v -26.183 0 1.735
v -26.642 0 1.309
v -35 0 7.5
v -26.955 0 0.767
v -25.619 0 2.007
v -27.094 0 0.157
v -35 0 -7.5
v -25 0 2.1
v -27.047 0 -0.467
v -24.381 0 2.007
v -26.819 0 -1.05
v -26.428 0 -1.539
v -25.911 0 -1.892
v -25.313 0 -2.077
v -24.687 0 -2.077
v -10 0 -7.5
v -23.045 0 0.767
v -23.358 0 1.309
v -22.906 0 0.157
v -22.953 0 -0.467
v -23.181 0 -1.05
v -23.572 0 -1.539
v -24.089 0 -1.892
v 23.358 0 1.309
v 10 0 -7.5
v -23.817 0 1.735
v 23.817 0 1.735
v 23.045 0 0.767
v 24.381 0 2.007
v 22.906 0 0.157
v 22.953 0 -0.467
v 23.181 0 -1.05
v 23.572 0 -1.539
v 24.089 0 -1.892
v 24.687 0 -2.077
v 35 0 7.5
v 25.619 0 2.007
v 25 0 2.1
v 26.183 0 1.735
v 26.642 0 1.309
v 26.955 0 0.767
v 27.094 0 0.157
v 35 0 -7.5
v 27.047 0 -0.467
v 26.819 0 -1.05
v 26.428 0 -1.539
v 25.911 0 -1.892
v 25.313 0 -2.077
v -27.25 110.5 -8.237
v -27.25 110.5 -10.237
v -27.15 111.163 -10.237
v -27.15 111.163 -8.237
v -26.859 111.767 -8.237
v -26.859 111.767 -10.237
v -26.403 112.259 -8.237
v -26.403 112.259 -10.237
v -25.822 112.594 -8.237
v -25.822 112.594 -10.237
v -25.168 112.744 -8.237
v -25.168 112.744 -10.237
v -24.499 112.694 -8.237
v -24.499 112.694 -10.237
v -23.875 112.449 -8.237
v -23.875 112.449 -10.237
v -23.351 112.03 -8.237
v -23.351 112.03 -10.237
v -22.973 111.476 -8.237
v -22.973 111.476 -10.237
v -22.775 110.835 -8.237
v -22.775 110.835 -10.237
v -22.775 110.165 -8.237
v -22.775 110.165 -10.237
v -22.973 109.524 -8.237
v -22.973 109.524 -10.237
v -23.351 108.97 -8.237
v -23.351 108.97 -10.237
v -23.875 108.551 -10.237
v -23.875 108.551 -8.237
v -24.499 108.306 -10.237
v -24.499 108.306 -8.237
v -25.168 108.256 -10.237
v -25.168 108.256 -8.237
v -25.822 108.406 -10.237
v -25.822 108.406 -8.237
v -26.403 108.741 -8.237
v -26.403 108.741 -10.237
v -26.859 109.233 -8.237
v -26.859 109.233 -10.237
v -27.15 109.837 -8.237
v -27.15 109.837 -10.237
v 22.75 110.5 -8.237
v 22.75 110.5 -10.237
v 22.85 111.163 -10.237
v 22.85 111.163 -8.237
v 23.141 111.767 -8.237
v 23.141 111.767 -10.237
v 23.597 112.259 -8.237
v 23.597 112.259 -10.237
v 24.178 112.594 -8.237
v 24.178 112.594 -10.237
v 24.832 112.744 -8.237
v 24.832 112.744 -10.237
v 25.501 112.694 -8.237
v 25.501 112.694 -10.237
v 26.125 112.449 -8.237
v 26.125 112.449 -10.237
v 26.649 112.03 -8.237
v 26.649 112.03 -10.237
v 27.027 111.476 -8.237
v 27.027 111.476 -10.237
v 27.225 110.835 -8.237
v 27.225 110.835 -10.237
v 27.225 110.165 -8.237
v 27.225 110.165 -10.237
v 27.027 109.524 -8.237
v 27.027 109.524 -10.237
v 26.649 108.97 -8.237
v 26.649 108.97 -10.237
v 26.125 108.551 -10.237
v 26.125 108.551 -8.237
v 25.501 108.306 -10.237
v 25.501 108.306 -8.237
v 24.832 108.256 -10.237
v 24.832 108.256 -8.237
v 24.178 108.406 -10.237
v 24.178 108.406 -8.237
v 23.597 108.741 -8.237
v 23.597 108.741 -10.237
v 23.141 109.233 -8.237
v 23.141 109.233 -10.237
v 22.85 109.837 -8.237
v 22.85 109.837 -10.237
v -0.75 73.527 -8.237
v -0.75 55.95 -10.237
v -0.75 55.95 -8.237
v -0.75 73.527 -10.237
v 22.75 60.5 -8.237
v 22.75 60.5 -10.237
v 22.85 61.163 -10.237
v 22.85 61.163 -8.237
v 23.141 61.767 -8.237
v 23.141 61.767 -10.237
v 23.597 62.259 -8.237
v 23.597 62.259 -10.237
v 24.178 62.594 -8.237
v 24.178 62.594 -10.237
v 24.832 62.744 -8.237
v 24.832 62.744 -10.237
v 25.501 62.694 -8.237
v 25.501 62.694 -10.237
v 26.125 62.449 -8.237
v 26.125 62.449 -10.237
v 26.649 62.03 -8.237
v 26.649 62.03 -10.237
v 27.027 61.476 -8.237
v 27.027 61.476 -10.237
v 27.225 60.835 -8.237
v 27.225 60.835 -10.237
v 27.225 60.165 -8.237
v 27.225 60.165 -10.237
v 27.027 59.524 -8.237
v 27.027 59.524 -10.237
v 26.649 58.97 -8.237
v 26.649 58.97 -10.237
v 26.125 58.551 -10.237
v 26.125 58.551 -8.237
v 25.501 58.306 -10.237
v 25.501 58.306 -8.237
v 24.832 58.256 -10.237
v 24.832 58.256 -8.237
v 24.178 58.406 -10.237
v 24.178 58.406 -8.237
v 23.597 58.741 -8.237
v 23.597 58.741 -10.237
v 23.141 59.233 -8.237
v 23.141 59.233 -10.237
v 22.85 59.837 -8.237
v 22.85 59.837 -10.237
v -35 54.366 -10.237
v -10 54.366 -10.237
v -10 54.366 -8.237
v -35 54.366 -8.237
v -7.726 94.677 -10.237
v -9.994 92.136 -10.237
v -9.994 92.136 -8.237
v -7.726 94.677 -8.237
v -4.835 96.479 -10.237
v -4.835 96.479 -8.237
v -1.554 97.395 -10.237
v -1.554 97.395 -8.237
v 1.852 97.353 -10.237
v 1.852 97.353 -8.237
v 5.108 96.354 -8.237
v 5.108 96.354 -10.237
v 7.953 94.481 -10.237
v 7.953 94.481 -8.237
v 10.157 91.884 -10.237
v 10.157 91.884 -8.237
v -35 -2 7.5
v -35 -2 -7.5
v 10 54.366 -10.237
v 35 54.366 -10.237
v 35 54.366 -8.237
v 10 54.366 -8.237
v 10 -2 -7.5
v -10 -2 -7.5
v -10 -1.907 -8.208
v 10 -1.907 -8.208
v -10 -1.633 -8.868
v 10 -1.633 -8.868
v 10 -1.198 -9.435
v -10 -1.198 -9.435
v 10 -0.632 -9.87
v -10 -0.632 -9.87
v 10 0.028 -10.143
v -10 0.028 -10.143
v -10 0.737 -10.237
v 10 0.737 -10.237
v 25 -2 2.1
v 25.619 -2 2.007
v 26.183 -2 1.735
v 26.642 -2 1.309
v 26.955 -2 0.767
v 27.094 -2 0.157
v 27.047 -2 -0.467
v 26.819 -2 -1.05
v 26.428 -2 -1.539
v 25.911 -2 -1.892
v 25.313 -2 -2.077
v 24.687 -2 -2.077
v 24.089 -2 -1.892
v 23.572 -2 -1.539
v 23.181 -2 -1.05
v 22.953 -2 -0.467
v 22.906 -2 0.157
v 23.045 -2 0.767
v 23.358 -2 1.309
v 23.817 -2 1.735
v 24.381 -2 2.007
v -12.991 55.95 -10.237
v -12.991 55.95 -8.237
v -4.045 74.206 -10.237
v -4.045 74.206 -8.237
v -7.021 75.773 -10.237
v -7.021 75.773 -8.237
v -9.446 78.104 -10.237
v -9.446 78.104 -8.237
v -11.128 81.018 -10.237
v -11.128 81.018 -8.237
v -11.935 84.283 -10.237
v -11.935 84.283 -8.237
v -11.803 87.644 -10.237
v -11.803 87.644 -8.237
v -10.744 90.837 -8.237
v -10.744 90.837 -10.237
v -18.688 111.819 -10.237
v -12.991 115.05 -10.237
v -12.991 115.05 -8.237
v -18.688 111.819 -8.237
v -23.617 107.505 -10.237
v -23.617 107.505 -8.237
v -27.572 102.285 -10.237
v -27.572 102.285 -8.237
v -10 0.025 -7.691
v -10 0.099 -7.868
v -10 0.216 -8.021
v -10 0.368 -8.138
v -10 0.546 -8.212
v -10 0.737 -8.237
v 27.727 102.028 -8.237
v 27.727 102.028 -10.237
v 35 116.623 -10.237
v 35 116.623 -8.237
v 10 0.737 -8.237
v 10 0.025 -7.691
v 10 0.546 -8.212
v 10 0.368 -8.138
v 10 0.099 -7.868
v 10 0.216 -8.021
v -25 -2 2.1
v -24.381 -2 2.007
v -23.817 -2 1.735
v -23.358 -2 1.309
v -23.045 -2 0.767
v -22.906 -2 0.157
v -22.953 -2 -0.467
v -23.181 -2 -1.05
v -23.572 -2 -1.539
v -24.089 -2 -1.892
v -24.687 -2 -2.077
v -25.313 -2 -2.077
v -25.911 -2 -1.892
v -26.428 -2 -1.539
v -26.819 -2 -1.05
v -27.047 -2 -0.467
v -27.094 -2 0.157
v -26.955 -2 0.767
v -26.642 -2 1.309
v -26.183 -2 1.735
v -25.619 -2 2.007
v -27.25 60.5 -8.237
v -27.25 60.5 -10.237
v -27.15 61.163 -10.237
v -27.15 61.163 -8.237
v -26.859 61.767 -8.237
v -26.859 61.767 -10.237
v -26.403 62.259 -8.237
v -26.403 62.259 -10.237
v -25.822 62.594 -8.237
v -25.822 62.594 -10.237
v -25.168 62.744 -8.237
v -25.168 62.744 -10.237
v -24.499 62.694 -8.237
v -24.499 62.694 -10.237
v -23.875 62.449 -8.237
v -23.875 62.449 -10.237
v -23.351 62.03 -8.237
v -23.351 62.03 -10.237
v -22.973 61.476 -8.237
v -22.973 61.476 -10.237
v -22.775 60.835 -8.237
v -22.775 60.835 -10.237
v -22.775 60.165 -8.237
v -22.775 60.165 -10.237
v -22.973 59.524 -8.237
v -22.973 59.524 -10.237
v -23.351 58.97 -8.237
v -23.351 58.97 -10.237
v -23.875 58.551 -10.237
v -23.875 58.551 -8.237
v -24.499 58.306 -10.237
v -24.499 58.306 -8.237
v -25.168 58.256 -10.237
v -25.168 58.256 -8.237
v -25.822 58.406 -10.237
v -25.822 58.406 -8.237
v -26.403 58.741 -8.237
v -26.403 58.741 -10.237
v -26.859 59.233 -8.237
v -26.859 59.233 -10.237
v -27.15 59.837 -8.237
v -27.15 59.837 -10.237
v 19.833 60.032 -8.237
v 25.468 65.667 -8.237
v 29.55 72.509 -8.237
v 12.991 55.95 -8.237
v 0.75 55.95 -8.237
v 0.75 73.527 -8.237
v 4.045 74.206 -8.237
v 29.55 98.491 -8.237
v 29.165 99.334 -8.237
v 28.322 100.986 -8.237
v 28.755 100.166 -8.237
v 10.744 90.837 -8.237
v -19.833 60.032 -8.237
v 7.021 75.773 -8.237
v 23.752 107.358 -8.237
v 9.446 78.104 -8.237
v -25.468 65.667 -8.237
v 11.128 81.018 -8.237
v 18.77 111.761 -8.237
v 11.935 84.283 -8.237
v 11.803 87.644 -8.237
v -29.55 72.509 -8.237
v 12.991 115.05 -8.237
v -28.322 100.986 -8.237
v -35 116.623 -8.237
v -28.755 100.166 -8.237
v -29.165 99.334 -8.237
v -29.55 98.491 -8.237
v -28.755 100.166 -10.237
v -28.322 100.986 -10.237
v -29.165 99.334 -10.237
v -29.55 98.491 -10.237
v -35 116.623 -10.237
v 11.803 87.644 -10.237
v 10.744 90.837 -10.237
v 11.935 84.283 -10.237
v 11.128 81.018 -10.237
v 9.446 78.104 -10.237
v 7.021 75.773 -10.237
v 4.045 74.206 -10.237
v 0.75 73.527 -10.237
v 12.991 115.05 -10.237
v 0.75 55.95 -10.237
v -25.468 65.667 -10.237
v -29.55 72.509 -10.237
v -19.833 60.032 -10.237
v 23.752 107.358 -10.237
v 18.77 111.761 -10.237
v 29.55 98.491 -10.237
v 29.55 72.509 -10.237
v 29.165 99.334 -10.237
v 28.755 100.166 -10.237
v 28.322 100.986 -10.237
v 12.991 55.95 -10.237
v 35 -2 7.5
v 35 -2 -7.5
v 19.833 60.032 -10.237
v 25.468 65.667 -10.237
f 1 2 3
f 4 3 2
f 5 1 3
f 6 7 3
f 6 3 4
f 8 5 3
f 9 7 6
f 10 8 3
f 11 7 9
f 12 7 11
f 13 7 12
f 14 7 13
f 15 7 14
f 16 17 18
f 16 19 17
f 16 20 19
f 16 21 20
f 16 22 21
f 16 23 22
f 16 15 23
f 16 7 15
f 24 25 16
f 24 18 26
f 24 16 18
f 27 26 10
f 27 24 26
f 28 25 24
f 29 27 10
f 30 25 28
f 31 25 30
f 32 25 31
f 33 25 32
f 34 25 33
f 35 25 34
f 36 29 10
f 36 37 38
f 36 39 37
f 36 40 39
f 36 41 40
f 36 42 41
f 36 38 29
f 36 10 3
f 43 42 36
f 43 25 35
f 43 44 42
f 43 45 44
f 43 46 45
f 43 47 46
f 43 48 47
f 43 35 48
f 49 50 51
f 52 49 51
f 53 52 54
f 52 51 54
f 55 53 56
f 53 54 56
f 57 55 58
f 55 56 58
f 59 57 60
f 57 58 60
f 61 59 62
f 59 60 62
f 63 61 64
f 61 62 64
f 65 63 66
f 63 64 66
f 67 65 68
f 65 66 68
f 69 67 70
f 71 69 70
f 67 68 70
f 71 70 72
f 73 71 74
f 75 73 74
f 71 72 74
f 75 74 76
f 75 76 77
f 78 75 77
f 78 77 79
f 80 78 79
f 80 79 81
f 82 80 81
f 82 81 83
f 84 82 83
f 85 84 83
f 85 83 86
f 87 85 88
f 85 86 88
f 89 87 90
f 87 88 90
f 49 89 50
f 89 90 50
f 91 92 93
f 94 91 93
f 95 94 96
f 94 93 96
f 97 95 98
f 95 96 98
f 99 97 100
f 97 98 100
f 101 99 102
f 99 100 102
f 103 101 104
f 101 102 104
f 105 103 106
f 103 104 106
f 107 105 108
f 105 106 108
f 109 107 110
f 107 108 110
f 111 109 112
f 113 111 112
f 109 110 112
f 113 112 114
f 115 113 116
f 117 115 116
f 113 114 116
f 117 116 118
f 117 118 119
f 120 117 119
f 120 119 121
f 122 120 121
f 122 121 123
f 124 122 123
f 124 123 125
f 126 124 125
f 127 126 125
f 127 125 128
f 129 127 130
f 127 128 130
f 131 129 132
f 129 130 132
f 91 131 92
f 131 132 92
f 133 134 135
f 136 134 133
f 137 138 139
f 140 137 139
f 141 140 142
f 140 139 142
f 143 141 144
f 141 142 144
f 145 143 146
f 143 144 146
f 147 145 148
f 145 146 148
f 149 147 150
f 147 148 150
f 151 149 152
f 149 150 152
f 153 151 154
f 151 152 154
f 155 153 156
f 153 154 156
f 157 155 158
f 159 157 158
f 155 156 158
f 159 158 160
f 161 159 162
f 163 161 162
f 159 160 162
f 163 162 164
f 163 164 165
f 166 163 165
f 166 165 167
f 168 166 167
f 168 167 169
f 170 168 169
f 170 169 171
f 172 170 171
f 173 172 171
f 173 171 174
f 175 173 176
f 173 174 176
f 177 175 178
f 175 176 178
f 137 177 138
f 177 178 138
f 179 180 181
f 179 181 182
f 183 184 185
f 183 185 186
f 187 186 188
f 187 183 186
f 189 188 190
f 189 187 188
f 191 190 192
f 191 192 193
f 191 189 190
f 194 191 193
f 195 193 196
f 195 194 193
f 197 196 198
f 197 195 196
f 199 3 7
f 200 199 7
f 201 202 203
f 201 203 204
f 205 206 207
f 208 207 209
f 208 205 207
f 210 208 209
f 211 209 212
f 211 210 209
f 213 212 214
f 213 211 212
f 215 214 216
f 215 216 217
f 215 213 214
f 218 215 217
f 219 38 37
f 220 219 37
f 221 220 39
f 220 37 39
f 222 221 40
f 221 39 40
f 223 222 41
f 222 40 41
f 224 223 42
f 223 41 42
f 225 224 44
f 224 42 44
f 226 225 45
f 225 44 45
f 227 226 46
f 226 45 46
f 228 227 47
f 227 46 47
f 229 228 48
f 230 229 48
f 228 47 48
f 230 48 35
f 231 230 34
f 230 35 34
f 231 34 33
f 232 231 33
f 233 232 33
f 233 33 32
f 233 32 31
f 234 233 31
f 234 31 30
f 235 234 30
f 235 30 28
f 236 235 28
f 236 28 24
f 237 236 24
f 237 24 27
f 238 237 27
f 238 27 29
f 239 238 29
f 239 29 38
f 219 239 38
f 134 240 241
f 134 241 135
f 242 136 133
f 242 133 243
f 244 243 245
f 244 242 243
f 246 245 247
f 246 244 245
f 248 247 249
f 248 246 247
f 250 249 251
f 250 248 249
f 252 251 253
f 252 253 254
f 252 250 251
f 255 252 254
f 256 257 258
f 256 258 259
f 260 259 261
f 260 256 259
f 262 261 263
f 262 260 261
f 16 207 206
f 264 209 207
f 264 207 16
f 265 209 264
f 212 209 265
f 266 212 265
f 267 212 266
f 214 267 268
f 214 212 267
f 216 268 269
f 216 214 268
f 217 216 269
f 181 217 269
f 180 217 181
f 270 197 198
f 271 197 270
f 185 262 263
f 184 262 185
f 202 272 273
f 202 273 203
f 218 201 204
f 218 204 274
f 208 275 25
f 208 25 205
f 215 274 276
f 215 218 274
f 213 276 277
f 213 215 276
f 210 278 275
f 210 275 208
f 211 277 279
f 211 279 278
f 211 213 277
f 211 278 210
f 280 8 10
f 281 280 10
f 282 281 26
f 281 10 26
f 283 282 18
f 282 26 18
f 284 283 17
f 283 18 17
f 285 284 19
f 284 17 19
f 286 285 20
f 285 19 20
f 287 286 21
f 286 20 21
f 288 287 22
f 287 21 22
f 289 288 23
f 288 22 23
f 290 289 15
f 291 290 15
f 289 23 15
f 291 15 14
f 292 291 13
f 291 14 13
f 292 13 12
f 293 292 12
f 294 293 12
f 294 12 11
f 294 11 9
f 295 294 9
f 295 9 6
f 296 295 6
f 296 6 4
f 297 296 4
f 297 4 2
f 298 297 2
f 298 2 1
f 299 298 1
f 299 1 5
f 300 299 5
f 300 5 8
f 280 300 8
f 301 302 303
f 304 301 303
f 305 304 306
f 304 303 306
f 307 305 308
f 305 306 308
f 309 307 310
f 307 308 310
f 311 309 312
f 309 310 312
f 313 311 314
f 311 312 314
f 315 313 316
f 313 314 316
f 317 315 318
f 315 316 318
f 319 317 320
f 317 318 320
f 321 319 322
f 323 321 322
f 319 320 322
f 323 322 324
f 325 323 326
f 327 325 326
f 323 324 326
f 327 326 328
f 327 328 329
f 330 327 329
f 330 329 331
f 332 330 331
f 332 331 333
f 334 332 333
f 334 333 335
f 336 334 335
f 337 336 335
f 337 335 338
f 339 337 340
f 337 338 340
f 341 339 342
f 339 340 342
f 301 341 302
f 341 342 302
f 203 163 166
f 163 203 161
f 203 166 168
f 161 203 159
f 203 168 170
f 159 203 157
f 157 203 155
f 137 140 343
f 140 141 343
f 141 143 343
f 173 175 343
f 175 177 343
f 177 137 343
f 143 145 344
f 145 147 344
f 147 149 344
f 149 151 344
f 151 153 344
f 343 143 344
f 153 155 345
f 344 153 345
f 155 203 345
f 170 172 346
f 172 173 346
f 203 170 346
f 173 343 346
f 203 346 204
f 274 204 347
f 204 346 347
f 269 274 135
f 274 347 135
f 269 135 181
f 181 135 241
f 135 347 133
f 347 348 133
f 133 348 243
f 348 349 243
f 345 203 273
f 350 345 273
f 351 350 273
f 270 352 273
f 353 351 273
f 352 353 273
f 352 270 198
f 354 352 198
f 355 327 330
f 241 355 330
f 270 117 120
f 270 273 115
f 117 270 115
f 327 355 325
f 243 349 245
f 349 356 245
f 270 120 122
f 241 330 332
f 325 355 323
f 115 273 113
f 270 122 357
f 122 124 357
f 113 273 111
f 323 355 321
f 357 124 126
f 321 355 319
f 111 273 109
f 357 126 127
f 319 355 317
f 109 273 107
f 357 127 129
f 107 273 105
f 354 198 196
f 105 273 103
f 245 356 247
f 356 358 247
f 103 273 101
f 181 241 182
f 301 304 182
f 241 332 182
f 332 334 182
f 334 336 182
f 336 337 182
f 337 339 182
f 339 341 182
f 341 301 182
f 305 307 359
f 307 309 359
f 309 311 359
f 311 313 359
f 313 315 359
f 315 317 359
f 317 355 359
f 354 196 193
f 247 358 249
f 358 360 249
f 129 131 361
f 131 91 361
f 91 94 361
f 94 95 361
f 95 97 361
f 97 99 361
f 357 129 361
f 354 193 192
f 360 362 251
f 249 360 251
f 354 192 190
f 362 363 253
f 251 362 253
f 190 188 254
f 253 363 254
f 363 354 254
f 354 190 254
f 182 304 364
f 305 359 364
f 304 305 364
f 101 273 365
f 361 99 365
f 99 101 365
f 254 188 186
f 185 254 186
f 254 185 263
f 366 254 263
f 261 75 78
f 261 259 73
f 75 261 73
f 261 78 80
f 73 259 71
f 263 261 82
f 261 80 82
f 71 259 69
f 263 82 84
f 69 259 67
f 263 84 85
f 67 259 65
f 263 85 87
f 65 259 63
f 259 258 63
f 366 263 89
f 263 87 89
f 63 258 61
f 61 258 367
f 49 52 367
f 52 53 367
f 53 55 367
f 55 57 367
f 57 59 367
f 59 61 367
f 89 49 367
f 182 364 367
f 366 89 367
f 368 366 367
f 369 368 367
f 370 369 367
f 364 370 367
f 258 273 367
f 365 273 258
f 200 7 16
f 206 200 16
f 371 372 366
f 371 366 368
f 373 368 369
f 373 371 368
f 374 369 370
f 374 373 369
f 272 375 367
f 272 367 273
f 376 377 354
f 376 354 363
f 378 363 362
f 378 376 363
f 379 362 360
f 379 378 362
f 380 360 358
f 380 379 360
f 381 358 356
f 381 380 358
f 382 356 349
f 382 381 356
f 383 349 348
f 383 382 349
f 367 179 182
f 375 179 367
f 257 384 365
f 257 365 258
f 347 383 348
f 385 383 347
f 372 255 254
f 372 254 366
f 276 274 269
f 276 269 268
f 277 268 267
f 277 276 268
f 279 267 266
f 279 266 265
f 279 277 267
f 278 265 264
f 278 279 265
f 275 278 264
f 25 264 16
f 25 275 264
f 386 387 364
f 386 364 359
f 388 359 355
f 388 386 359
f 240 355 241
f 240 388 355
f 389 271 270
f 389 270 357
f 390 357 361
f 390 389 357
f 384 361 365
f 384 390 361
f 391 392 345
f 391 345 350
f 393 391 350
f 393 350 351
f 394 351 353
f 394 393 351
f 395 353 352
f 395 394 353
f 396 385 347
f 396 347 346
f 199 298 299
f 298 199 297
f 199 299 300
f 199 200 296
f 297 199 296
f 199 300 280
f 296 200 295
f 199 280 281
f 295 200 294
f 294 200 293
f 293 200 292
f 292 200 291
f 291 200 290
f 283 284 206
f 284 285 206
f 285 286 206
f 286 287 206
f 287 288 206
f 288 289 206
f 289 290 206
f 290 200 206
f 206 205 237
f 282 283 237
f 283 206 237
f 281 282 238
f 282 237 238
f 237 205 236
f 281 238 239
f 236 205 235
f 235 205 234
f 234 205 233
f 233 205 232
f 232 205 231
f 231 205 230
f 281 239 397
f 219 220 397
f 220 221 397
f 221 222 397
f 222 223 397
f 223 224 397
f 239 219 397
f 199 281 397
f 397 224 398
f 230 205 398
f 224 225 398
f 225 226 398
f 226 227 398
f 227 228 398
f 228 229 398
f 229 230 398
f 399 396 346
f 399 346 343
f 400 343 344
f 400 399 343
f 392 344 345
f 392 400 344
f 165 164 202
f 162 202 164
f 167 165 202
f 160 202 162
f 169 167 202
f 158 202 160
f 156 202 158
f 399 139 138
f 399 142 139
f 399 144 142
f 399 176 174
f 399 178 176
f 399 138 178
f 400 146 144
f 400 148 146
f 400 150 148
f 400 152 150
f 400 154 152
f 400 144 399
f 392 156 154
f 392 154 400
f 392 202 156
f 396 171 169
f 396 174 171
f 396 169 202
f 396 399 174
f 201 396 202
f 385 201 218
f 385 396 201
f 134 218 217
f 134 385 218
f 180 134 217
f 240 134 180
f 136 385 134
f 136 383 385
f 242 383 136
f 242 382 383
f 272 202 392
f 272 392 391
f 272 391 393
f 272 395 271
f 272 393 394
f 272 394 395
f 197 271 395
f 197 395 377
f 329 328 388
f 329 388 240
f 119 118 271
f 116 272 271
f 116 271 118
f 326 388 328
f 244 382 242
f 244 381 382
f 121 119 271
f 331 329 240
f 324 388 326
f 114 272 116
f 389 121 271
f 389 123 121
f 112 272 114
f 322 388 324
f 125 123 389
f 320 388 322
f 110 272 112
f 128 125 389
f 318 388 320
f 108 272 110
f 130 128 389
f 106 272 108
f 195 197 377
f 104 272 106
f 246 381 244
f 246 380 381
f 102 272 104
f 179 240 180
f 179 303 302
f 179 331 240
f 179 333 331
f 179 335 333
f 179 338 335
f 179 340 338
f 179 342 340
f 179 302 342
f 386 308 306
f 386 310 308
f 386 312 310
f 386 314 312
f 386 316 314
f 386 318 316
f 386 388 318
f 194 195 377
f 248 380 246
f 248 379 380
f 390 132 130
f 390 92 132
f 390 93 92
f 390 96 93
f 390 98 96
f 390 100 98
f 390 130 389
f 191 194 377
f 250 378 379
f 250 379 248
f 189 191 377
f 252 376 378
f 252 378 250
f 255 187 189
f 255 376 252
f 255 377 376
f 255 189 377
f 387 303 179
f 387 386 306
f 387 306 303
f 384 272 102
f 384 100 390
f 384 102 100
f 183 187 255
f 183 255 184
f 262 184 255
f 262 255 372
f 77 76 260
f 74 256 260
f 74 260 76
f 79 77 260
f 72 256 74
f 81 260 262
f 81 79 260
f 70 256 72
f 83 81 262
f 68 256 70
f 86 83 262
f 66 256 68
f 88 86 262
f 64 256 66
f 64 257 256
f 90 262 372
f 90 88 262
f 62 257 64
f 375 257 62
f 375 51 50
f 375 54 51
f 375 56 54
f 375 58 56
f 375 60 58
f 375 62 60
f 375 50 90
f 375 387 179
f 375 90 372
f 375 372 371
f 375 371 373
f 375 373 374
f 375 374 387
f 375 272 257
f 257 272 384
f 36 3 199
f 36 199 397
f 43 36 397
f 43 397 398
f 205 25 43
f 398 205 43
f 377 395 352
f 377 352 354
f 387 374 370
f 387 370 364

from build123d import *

# Parameters (mm, degrees)
SKETCH1_W               = 70
SKETCH1_H               = 15
BASE_FLANGE1_DEPTH      = 2
EDGE_FLANGE1_DEPTH      = 20
EDGE_FLANGE1_START      = 2
EDGE_FLANGE1_PROFILE_R  = 2.25
EDGE_FLANGE1_FLAT_DEPTH = 2
SKETCH18_R              = 2.1
CUT_EXTRUDE1_DEPTH      = 10


# Sheet-metal steps are written as plain solids
with BuildPart() as part:
    # Sketch1 → Base-Flange1 (new body)
    with BuildSketch(Plane(origin=(0, 0, 0), x_dir=(1, 0, 0), z_dir=(0, 1, 0))):
        Rectangle(SKETCH1_W, SKETCH1_H)
    extrude(amount=-BASE_FLANGE1_DEPTH)

    # Edge-Flange1 bend section (across the edge) → Edge-Flange1 (add)
    with BuildSketch(Plane(origin=(10, 0, -8.2366), x_dir=(0, 0, 1), z_dir=(-1, 0, 0))):
        with BuildLine():
            Line((-2, 0.7366), (0, 0.7366))
            ThreePointArc((0, 0.7366), (0.215745145, 0.215745145), (0.7366, 0))
            Line((0.7366, 0), (0.7366, -2))
            ThreePointArc((0.7366, -2), (-1.198468417, -1.198468417), (-2, 0.7366))
        make_face()
    extrude(amount=EDGE_FLANGE1_DEPTH)

    # Edge-Flange1 profile (on flange) → Edge-Flange1 flat (add)
    with BuildSketch(Plane(origin=(0, 0, -8.2366), x_dir=(-1, 0, 0), z_dir=(0, 0, -1)).offset(EDGE_FLANGE1_START)):
        Polygon((-10, 0.7366), (10, 0.7366), (10, 54.366187709), (35, 54.366187709), (35, 116.622772523), (-35, 116.622772523), (-35, 54.366187709), (-10, 54.366187709), align=None)
        with Locations((25, 60.5)):
            Circle(EDGE_FLANGE1_PROFILE_R, mode=Mode.SUBTRACT)
        with BuildLine():
            Line((29.55, 98.490926284), (29.55, 72.509073716))
            ThreePointArc((29.55, 72.509073716), (22.825059318, 62.674940682), (12.990926284, 55.95))
            Line((12.990926284, 55.95), (0.75, 55.95))
            Line((0.75, 55.95), (0.75, 73.527045436))
            ThreePointArc((0.75, 73.527045436), (10.389206213, 79.501788996), (10.74388281, 90.836958229))
            Line((10.74388281, 90.836958229), (28.322327677, 100.985878105))
            ThreePointArc((28.322327677, 100.985878105), (28.963041516, 99.751627692), (29.55, 98.490926284))
        make_face(mode=Mode.SUBTRACT)
        with Locations((-25, 60.5)):
            Circle(EDGE_FLANGE1_PROFILE_R, mode=Mode.SUBTRACT)
        with BuildLine():
            Line((-0.75, 55.95), (-12.990926284, 55.95))
            ThreePointArc((-12.990926284, 55.95), (-22.825059318, 62.674940682), (-29.55, 72.509073716))
            Line((-29.55, 72.509073716), (-29.55, 98.490926284))
            ThreePointArc((-29.55, 98.490926284), (-28.963041516, 99.751627692), (-28.322327677, 100.985878105))
            Line((-28.322327677, 100.985878105), (-10.74388281, 90.836958229))
            ThreePointArc((-10.74388281, 90.836958229), (-10.389206213, 79.501788996), (-0.75, 73.527045436))
            Line((-0.75, 73.527045436), (-0.75, 55.95))
        make_face(mode=Mode.SUBTRACT)
        with Locations((25, 110.5)):
            Circle(EDGE_FLANGE1_PROFILE_R, mode=Mode.SUBTRACT)
        with BuildLine():
            Line((-10.156894371, 91.883700942), (-27.727157775, 102.027897248))
            ThreePointArc((-27.727157775, 102.027897248), (-21.374853973, 109.688474184), (-12.990926284, 115.05))
            Line((-12.990926284, 115.05), (12.990926284, 115.05))
            ThreePointArc((12.990926284, 115.05), (21.262202003, 109.787557137), (27.572327677, 102.28491621))
            Line((27.572327677, 102.28491621), (9.99388281, 92.135996335))
            ThreePointArc((9.99388281, 92.135996335), (-0.150187994, 97.495481839), (-10.156894371, 91.883700942))
        make_face(mode=Mode.SUBTRACT)
        with Locations((-25, 110.5)):
            Circle(EDGE_FLANGE1_PROFILE_R, mode=Mode.SUBTRACT)
    extrude(amount=-EDGE_FLANGE1_FLAT_DEPTH)

    # Sketch18 → Cut-Extrude1 (cut)
    with BuildSketch(Plane(origin=(0, 0, 0), x_dir=(1, 0, 0), z_dir=(0, 1, 0))):
        with Locations(Location((-25, 0, 0), (0, 0, 270))):
            Circle(SKETCH18_R)
        with Locations(Location((25, 0, 0), (0, 0, 270))):
            Circle(SKETCH18_R)
    extrude(amount=-CUT_EXTRUDE1_DEPTH, mode=Mode.SUBTRACT)


solid = part.part
